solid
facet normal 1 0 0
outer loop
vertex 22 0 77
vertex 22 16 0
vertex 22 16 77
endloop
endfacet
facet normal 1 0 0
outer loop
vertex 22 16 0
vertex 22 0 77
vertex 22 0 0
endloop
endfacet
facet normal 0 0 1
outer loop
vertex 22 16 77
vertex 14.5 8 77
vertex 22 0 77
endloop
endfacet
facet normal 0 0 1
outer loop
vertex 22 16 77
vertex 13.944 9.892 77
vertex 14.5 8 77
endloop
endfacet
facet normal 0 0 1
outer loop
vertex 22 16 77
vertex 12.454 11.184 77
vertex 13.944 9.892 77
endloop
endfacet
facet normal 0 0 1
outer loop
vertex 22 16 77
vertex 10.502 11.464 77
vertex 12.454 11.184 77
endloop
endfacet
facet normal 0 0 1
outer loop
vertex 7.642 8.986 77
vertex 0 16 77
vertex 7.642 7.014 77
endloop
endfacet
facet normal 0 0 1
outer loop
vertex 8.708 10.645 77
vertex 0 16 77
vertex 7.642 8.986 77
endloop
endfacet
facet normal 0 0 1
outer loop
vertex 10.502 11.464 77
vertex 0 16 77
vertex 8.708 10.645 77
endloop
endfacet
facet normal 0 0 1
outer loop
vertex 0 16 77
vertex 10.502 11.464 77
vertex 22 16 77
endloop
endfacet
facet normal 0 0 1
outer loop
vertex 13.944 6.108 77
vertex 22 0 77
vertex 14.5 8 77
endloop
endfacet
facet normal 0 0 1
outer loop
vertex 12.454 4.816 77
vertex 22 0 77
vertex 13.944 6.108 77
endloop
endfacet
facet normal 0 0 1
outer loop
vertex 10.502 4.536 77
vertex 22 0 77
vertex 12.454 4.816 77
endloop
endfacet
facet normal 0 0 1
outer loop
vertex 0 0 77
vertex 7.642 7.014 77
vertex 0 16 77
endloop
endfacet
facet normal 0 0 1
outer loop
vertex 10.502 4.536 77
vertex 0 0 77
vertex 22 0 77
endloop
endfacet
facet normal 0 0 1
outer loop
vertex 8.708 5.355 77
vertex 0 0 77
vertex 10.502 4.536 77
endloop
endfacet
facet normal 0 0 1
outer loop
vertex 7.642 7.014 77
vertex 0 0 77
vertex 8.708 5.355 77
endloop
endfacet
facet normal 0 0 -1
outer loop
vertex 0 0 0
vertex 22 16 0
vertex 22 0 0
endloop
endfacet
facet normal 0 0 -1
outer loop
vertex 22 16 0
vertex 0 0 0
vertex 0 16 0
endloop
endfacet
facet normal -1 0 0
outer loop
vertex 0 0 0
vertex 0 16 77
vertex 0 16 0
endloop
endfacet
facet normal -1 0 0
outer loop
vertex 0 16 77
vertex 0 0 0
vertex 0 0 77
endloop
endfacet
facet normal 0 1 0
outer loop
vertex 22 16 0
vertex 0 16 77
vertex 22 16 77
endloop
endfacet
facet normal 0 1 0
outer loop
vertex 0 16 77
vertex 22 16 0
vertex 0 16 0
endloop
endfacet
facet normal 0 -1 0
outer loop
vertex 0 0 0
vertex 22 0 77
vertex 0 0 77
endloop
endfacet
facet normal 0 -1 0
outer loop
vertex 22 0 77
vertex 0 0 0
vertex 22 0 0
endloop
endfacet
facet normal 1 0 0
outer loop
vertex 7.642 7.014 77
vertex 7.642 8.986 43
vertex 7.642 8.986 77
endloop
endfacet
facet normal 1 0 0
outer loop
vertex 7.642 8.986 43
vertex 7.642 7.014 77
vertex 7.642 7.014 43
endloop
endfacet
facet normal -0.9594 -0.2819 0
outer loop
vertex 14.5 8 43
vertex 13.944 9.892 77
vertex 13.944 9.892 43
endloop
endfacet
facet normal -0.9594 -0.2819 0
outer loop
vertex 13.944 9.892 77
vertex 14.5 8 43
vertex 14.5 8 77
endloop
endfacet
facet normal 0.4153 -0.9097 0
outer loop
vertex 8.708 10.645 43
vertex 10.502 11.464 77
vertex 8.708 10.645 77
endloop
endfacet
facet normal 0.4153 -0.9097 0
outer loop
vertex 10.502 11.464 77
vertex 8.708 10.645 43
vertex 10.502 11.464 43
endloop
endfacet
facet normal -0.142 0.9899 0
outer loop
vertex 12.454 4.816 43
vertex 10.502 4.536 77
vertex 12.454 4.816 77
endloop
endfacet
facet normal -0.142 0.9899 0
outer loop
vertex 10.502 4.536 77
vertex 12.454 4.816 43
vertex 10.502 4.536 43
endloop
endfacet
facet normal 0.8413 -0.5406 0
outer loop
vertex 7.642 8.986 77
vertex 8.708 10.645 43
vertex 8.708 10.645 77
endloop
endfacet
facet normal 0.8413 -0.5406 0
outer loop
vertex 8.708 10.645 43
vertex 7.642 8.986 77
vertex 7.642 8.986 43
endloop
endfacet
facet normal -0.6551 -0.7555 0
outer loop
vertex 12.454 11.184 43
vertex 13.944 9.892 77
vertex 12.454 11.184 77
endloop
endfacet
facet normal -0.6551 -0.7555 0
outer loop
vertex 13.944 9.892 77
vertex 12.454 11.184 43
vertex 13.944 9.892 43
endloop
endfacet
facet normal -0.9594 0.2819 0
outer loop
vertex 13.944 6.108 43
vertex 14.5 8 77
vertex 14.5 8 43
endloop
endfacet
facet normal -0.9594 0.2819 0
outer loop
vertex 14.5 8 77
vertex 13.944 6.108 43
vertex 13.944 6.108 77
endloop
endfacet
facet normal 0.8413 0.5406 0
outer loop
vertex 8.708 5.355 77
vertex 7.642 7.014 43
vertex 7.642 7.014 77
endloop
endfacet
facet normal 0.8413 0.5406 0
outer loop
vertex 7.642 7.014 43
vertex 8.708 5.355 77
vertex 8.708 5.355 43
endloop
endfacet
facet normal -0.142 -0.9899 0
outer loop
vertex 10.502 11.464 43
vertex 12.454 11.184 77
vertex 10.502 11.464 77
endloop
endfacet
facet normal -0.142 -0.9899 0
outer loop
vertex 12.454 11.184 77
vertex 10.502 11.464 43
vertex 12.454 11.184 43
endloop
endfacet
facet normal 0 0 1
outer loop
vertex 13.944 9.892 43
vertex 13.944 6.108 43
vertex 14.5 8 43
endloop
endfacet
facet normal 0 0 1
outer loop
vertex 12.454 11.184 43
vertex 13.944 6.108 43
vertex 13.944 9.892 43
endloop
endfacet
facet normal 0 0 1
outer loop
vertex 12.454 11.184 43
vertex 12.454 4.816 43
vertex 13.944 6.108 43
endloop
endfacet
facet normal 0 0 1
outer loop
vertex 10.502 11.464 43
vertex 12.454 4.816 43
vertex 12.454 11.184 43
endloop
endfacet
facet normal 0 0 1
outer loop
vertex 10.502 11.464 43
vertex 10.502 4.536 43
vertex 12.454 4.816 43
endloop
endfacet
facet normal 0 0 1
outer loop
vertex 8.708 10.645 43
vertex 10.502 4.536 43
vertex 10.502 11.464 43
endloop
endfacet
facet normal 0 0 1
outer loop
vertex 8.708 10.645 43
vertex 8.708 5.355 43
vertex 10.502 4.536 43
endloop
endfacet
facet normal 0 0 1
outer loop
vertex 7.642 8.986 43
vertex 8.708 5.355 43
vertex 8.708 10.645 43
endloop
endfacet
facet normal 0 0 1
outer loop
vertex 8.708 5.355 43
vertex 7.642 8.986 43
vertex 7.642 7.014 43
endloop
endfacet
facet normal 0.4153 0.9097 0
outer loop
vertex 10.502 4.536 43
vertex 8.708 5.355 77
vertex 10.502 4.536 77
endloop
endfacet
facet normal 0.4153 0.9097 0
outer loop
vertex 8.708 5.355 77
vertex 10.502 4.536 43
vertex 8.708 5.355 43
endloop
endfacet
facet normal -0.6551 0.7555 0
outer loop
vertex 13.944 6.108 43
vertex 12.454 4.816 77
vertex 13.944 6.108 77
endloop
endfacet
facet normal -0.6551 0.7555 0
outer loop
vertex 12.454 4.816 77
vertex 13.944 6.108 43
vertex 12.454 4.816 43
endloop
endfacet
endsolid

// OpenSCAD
difference()
{
	cube([22,16,77]);
	translate([11,8,43]) cylinder(h=35,d=7);
}
